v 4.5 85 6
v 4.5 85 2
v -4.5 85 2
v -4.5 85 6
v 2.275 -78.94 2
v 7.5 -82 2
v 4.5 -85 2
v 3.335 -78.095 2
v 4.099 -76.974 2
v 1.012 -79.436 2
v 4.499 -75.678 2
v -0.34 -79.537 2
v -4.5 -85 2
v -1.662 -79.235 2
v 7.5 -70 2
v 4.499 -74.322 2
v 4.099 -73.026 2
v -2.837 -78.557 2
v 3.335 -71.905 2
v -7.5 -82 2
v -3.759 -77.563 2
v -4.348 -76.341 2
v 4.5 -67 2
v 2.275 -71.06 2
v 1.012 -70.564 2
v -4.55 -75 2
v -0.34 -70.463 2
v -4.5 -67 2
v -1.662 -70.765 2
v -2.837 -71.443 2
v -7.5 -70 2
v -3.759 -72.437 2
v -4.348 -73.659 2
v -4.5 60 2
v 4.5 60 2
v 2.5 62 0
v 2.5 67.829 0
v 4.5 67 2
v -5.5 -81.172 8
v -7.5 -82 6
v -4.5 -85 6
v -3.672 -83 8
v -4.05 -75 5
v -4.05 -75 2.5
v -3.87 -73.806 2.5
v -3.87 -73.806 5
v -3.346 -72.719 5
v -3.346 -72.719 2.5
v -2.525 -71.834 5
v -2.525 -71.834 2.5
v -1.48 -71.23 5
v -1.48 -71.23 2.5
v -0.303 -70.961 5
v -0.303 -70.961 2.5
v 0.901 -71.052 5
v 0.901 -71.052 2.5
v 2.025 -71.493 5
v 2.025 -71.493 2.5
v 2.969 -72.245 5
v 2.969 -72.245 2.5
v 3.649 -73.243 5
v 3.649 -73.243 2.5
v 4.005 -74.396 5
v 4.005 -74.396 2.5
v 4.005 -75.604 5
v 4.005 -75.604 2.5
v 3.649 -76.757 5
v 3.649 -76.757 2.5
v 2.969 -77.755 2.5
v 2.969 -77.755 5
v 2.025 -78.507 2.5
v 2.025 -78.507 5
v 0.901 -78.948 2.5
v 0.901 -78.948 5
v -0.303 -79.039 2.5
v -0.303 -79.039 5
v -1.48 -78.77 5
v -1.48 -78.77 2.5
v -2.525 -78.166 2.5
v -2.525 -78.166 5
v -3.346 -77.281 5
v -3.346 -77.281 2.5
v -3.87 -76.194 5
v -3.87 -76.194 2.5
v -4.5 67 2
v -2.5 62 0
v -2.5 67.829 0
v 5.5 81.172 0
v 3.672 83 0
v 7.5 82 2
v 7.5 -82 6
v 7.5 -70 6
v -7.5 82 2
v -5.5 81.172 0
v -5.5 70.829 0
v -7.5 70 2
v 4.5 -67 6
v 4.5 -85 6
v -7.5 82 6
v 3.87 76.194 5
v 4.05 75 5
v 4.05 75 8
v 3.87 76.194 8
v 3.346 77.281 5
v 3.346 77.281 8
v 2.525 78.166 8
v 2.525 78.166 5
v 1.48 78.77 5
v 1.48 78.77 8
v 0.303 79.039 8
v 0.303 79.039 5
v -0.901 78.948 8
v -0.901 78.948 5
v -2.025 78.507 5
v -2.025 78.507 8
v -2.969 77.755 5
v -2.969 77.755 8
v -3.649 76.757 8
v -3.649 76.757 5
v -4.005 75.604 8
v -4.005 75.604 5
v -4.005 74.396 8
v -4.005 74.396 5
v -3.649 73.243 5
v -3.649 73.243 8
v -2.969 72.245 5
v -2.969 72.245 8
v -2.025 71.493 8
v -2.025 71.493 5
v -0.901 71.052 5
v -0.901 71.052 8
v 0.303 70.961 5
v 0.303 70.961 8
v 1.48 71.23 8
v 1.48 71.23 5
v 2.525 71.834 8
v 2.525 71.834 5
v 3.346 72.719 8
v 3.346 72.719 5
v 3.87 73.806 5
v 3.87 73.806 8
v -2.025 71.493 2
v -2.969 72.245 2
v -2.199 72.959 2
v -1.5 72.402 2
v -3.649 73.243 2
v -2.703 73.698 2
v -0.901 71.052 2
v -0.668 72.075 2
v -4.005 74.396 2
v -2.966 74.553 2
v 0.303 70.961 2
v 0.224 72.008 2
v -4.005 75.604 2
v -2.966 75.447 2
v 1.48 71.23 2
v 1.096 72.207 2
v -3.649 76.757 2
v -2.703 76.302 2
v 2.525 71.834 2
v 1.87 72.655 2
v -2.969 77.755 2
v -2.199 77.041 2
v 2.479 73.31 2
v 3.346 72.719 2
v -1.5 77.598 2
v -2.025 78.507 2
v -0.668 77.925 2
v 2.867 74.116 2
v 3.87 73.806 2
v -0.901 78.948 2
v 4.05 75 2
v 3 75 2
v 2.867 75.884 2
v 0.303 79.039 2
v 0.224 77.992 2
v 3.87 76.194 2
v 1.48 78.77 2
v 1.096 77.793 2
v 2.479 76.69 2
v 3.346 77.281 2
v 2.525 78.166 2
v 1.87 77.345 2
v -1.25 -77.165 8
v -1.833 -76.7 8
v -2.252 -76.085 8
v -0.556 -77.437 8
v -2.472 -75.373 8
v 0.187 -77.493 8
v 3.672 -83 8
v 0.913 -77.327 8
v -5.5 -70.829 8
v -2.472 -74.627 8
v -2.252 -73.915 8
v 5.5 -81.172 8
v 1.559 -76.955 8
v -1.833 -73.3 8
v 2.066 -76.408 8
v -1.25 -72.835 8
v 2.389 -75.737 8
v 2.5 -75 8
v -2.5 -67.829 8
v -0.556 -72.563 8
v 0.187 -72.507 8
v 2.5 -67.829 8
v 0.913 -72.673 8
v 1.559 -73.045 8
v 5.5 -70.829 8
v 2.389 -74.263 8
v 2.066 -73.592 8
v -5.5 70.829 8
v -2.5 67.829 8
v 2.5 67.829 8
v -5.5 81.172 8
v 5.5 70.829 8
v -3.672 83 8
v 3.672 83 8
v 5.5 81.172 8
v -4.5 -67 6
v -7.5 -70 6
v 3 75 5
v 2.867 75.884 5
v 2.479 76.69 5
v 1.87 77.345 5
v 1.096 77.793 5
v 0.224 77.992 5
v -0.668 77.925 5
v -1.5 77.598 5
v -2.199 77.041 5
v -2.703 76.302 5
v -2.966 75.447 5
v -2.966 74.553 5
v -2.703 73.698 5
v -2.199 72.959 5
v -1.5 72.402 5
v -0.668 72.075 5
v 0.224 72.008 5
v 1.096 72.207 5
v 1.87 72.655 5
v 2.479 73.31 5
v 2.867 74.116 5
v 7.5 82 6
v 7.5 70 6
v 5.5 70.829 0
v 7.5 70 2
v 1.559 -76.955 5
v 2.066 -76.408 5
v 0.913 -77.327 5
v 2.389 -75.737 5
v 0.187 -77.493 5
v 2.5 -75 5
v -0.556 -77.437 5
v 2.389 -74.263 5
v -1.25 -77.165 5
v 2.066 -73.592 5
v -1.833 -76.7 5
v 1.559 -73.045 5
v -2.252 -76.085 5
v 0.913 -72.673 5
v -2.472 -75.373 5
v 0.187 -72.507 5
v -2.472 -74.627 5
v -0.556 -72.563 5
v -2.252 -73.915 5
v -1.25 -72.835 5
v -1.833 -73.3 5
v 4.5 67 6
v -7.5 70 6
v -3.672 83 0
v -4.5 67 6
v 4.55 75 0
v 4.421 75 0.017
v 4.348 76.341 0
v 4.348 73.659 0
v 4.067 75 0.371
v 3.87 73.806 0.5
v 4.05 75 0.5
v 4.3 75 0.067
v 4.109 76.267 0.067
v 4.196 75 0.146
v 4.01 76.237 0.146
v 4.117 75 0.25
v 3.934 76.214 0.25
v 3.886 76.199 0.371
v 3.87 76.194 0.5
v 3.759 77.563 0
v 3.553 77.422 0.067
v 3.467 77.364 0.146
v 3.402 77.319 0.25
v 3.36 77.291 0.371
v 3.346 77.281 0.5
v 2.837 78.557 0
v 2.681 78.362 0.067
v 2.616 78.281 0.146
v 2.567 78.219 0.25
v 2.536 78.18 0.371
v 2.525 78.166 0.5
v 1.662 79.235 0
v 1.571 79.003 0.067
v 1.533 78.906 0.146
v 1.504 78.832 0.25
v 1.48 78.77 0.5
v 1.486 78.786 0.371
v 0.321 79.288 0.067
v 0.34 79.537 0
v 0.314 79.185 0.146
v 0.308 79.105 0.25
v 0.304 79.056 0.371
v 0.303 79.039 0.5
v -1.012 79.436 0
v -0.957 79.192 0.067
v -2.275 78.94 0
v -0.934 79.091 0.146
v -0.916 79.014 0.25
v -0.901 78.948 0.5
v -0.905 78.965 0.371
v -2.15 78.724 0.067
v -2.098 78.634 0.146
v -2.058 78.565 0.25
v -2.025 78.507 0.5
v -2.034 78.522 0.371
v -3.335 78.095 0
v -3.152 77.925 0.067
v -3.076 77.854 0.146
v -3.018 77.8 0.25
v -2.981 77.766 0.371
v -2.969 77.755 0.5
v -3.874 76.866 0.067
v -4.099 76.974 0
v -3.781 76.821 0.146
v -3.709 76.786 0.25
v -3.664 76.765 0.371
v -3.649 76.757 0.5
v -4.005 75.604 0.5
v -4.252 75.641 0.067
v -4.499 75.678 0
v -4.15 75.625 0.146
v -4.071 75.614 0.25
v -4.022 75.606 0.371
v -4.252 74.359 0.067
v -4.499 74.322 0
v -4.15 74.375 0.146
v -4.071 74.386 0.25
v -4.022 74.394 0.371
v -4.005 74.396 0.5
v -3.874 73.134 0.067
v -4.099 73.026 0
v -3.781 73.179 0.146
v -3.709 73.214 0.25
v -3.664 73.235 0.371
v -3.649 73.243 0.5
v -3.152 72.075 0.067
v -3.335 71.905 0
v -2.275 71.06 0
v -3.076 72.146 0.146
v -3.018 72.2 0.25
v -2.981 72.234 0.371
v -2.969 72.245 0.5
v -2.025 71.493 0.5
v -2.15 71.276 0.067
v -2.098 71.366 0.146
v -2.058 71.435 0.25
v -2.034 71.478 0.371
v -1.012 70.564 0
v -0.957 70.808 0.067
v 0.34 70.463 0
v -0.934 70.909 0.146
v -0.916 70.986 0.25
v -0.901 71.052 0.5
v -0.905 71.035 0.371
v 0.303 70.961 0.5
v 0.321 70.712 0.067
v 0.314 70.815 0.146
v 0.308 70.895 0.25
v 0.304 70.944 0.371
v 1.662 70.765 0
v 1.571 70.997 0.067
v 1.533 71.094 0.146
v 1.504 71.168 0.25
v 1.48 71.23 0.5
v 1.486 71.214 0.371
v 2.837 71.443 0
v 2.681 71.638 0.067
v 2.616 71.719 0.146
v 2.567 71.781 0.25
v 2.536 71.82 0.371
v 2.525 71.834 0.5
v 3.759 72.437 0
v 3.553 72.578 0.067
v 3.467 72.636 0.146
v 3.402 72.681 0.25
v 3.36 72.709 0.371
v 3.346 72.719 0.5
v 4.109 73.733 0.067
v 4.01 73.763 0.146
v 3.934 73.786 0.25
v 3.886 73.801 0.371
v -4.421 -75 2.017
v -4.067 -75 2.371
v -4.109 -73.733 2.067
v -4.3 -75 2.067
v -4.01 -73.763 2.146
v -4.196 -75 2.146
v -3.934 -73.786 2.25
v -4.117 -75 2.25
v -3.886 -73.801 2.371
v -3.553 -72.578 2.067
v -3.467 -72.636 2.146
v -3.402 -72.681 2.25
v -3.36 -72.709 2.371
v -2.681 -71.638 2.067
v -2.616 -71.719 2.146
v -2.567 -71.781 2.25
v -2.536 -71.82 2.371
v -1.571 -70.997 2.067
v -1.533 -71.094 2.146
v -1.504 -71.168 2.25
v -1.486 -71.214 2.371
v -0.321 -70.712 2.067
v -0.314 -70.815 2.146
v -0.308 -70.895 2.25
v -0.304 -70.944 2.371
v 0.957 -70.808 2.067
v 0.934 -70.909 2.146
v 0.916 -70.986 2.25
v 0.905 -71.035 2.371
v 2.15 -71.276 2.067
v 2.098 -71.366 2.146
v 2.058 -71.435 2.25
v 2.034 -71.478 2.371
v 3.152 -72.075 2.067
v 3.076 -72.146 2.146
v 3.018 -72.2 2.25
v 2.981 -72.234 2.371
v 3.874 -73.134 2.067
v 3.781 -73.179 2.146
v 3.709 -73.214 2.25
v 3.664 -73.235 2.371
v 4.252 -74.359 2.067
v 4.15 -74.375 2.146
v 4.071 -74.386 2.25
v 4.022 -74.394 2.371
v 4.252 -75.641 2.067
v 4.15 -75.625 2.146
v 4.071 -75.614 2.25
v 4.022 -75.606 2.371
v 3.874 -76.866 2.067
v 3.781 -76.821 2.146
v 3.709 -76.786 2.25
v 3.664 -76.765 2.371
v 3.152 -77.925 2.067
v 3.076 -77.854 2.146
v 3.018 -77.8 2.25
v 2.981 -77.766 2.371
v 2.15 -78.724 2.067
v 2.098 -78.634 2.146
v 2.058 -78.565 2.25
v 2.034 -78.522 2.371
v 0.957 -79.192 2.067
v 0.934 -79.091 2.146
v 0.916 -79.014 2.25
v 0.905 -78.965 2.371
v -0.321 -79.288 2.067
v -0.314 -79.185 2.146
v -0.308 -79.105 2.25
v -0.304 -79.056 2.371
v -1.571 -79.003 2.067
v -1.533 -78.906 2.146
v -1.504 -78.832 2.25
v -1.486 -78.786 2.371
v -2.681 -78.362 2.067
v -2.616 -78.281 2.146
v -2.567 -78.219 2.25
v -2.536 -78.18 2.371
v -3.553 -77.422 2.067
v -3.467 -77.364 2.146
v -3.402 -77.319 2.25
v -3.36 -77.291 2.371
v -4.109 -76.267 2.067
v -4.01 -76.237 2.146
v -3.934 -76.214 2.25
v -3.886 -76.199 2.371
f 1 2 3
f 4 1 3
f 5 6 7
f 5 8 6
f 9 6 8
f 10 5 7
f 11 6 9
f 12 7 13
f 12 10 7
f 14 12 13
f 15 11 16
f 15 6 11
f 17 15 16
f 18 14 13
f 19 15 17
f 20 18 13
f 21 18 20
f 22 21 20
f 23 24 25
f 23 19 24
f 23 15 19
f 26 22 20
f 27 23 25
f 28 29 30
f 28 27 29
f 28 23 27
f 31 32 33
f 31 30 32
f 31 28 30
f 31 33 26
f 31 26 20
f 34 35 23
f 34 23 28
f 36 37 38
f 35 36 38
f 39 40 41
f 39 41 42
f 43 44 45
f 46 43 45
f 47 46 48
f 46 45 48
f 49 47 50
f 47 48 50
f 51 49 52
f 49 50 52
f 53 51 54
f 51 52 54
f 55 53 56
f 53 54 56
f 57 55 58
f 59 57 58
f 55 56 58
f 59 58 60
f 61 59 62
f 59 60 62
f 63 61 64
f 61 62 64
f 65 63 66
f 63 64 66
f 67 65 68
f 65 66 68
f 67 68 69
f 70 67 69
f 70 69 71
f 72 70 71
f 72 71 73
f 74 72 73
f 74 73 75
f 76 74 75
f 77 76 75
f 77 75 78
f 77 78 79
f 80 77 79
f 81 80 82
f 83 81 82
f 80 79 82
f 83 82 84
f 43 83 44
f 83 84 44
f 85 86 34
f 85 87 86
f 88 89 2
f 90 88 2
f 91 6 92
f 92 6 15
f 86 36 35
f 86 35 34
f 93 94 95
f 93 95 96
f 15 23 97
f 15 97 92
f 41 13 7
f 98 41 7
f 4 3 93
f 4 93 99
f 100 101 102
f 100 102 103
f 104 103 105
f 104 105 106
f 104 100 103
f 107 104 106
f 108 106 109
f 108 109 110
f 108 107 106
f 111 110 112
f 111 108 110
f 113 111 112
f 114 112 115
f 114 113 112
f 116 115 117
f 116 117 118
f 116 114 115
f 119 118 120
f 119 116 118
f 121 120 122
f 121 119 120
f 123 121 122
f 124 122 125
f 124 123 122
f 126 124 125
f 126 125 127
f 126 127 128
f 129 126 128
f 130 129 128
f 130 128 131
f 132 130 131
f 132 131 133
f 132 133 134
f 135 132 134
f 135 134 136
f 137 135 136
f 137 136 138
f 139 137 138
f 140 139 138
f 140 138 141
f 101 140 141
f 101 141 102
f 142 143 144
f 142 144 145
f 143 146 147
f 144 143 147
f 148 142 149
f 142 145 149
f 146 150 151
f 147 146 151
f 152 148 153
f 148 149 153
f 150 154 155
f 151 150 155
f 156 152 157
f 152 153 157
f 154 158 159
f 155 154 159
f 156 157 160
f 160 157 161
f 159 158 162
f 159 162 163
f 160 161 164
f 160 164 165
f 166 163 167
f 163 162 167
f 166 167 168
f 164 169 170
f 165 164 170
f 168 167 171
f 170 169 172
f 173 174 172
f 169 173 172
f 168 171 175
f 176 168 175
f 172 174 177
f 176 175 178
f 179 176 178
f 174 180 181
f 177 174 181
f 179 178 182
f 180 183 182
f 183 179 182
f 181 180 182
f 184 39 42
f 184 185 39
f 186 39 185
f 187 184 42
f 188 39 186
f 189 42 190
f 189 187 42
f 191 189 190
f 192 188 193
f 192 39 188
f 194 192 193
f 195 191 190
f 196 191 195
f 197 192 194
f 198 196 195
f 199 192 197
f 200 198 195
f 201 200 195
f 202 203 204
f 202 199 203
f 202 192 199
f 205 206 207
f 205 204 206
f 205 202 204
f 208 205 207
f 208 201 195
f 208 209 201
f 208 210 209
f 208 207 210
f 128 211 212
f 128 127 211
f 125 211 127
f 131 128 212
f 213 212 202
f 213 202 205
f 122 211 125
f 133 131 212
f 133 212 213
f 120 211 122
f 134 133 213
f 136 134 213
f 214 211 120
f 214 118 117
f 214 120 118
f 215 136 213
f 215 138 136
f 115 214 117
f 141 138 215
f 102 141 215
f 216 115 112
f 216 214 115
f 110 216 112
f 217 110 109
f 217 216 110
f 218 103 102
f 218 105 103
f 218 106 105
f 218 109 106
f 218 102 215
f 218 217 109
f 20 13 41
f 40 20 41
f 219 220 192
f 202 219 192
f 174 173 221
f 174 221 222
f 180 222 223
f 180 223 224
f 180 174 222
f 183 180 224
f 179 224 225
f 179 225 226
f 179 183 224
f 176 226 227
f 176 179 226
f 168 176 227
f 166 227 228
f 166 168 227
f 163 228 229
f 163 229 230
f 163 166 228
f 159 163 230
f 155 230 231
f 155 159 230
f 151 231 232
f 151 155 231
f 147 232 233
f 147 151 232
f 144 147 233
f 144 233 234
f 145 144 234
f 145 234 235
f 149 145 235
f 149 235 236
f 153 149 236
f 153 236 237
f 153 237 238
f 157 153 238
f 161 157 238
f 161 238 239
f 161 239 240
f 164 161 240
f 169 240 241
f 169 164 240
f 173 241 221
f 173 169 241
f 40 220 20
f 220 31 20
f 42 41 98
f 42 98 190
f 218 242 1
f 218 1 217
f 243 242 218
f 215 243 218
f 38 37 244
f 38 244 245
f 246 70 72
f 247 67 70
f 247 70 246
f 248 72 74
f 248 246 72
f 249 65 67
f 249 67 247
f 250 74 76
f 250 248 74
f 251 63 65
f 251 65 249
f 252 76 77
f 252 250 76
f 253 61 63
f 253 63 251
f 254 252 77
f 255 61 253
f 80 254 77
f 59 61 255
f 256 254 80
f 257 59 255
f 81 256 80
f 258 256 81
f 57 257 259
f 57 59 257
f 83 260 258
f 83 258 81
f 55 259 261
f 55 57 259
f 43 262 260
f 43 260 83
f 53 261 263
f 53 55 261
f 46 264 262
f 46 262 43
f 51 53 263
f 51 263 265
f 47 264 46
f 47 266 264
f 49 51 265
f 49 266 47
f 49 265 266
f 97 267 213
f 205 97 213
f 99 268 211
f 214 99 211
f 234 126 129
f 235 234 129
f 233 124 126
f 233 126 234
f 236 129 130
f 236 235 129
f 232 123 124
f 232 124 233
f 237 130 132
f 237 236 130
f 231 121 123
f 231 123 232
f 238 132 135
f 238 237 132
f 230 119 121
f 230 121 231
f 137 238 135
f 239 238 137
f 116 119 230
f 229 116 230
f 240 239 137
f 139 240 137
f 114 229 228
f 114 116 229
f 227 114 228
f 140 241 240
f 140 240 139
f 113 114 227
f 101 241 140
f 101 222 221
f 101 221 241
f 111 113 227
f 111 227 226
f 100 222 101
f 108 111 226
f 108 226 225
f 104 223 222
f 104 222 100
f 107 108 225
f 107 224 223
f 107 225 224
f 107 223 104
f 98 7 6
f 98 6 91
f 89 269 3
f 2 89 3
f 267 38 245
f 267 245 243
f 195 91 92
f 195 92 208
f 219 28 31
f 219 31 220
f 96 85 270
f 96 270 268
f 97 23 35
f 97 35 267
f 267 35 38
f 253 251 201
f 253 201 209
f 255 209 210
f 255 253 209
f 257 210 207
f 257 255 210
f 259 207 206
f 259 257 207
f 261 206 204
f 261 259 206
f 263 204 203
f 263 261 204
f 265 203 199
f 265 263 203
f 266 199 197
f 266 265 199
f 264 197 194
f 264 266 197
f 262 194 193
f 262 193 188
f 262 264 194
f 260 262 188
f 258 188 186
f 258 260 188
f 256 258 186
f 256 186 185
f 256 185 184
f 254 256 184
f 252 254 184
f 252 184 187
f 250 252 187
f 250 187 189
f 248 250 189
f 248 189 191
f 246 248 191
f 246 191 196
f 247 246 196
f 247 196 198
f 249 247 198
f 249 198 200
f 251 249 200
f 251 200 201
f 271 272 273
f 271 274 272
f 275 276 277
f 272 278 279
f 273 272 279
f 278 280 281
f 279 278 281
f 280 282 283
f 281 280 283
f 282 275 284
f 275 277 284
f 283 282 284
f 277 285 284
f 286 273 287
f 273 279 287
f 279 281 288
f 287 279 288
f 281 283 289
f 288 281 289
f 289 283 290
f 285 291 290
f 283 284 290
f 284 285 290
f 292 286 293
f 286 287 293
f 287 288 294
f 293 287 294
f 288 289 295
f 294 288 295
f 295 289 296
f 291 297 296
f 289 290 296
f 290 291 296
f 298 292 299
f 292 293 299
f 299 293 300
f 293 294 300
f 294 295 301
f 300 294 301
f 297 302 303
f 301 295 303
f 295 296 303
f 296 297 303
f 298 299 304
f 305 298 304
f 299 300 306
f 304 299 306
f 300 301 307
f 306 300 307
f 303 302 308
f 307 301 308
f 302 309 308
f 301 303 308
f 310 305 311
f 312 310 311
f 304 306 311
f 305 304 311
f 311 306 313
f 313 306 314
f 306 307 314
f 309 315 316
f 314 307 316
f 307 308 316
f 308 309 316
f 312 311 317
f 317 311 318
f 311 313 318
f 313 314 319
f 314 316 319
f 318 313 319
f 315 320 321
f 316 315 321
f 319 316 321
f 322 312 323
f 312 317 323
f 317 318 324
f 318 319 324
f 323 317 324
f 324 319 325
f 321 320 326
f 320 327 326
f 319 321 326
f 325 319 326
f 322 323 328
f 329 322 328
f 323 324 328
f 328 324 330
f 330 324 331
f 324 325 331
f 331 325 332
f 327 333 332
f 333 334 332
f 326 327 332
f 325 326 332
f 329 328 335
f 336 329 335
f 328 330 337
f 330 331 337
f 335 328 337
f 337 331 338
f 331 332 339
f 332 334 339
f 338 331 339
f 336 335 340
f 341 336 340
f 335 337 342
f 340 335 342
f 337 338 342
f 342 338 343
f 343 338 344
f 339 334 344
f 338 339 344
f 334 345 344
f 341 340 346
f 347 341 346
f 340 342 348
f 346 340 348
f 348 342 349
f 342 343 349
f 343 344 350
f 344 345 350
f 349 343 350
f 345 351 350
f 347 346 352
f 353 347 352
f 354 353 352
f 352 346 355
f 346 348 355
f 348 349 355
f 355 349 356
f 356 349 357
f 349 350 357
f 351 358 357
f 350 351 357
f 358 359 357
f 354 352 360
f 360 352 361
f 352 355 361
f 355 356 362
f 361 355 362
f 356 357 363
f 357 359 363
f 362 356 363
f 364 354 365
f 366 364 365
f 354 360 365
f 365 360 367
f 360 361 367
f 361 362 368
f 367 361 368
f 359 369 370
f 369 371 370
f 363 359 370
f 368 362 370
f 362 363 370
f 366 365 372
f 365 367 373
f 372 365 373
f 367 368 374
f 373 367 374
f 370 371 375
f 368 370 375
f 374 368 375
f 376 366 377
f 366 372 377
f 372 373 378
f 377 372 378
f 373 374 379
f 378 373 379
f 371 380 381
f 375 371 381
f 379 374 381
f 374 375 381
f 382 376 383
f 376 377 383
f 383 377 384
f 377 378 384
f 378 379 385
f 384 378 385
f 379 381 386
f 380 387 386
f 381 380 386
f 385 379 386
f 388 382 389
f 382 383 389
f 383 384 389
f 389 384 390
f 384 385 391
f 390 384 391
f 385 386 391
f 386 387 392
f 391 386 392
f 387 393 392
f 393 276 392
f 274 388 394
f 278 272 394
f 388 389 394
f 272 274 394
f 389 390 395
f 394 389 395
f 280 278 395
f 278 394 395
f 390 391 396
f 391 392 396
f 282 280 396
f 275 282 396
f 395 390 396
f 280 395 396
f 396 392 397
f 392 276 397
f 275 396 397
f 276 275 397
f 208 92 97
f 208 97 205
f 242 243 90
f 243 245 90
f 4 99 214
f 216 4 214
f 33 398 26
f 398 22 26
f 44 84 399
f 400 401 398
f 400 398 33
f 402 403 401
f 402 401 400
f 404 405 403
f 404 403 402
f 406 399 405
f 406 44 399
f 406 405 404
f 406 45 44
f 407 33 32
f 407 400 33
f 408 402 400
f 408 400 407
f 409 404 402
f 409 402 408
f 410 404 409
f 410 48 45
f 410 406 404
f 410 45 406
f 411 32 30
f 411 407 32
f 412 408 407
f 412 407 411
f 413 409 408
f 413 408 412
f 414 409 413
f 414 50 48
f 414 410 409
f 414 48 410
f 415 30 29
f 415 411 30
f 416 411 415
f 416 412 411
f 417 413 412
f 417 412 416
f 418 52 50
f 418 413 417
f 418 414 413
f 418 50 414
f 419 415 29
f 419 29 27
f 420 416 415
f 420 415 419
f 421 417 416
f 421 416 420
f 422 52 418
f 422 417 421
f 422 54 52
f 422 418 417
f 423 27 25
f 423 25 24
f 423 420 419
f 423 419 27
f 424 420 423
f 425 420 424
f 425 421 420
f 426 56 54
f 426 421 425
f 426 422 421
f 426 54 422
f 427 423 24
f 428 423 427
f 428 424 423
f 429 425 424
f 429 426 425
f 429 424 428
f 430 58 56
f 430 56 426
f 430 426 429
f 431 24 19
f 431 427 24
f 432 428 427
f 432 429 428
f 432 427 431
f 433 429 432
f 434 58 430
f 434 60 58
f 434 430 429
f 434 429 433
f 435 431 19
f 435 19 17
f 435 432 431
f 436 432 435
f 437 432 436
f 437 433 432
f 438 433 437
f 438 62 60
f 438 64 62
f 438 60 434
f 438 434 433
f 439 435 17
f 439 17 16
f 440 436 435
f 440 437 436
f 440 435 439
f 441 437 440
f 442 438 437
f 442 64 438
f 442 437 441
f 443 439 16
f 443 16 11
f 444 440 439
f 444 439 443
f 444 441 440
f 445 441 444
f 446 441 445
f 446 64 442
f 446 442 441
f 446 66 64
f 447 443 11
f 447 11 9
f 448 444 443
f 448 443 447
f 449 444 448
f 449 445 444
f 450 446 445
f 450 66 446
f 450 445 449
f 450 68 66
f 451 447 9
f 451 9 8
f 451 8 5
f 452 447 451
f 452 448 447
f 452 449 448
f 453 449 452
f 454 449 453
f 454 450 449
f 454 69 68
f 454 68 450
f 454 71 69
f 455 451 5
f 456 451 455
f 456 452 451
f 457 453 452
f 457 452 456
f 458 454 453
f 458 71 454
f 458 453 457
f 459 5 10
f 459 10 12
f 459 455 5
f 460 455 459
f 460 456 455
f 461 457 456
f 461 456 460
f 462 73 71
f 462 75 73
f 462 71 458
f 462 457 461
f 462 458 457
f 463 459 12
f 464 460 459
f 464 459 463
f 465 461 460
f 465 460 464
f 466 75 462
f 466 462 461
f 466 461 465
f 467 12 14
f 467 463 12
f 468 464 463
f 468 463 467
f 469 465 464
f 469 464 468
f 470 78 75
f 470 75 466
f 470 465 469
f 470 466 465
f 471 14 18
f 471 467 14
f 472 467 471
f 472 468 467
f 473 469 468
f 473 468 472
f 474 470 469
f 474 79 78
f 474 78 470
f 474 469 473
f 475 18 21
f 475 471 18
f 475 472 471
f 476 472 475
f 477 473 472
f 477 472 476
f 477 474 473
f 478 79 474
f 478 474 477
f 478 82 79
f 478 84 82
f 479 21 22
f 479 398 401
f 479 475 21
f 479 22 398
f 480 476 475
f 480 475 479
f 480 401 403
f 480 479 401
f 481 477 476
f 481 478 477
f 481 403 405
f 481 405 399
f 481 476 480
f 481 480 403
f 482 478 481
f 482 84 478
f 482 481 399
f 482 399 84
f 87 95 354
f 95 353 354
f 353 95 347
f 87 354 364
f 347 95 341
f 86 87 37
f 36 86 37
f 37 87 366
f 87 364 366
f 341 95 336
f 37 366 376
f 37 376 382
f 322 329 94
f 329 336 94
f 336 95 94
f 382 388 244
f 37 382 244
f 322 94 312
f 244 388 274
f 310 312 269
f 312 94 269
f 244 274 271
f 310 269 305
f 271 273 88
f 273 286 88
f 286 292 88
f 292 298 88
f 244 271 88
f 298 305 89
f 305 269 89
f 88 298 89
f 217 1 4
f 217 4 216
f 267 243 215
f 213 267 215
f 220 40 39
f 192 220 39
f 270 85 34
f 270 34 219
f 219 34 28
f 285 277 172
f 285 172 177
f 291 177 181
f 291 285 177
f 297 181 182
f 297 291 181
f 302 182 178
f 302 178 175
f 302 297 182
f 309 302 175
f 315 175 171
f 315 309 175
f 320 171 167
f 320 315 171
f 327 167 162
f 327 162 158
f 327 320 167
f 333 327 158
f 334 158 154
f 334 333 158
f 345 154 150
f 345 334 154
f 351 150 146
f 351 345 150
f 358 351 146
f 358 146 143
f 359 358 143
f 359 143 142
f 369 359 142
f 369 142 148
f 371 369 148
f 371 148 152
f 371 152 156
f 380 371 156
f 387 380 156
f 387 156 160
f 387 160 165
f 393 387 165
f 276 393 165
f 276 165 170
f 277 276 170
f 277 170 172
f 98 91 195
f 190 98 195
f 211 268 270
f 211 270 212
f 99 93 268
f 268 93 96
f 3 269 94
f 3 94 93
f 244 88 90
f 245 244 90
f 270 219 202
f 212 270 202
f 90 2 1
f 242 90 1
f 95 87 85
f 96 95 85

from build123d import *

# Parameters (mm, degrees)
SKETCH_1_R           = 2.5
SKETCH_1_R_2         = 4.05
EXTRUDE_1_DEPTH      = 8
CHAMFER_2_SIZE       = 3
EXTRUDE_2_DEPTH      = 1
EXTRUDE_2_DEPTH_BACK = 2
SKETCH_2_R           = 4.05
SKETCH_2_R_2         = 3
CHAMFER_3_SIZE       = 2
CHAMFER_4_SIZE       = 2
FILLET_1_R           = 0.5
FILLET_2_R           = 0.5
SKETCH_3_W           = 18.755341831
SKETCH_3_H           = 148.115808698
CUT_EXTRUDE_1_DEPTH  = 2
CHAMFER_5_SIZE       = 2
SKETCH_4_R           = 4.05
CUT_EXTRUDE_2_DEPTH  = 3
FILLET_3_R           = 0.5


# Some blends are built 0.0001 mm under size
with BuildPart() as part:
    # 草图1 → 凸台-拉伸1 (new body)
    with BuildSketch(Plane.XY):
        Polygon((-7.5, 70), (-4.5, 70), (-4.5, -70), (-7.5, -70), (-7.5, -85), (7.5, -85), (7.5, -70), (4.5, -70), (4.5, 70), (7.5, 70), (7.5, 85), (-7.5, 85), align=None)
        with Locations((0, -75)):
            Circle(SKETCH_1_R, mode=Mode.SUBTRACT)
        with Locations((0, 75)):
            Circle(SKETCH_1_R_2, mode=Mode.SUBTRACT)
    extrude(amount=EXTRUDE_1_DEPTH)

    # 倒角2
    chamfer_2_edges = [part.edges().sort_by_distance(p)[0] for p in [
        (-4.5, -70, 4),
        (4.5, -70, 4),
        (-4.5, 70, 4),
        (4.5, 70, 4),
    ]]
    chamfer(chamfer_2_edges, length=CHAMFER_2_SIZE - 0.0001)  # a hair under: the kernel refuses the full size
    chamfer_2_2_edges = [part.edges().sort_by_distance(p)[0] for p in [
        (7.5, -85, 4),
        (-7.5, -85, 4),
        (7.5, 85, 4),
        (-7.5, 85, 4),
    ]]
    chamfer(chamfer_2_2_edges, length=CHAMFER_2_SIZE)

    # 草图2 → 凸台-拉伸2 (add, two sides: drawn at the far end of the back side and taken through both)
    with BuildSketch(Plane.XY.offset(4).offset(-EXTRUDE_2_DEPTH_BACK)):
        with Locations((0, 75)):
            Circle(SKETCH_2_R)
        with Locations((0, 75)):
            Circle(SKETCH_2_R_2, mode=Mode.SUBTRACT)
    extrude(amount=EXTRUDE_2_DEPTH + EXTRUDE_2_DEPTH_BACK)

    # 倒角3
    # the kernel refuses this chamfer: 2 mm, written as the material it takes off along each edge
    with BuildSketch(Plane(origin=(-7.5, -64.856634024, 8), x_dir=(-0.027495876610586487, 0, -0.9996219169112968), z_dir=(0, -1, 0)), Plane(origin=(7.5, -87.143365976, 8), x_dir=(0.027495876610586487, 0, -0.9996219169112968), z_dir=(0, 1, 0)), Plane(origin=(7.5, 64.856634024, 8), x_dir=(0.027495876610586487, 0, -0.9996219169112968), z_dir=(0, 1, 0)), Plane(origin=(-7.5, 87.143365976, 8), x_dir=(-0.027495876610586487, 0, -0.9996219169112968), z_dir=(0, -1, 0))) as chamfer_3_piece_1:
        Polygon((CHAMFER_3_SIZE * 0.999621916911, CHAMFER_3_SIZE * 0.0274958766106), (-CHAMFER_3_SIZE * 0.0274958766106, CHAMFER_3_SIZE * 0.999621916911), (0, 0), align=None)
    extrude(amount=22.286731952, mode=Mode.SUBTRACT)
    with BuildSketch(Plane(origin=(-4.5, 72.143465976, 8), x_dir=(-0.027495876610586487, 0, -0.9996219169112968), z_dir=(0, -1, 0))) as chamfer_3_piece_2_section:
        Polygon((CHAMFER_3_SIZE * 0.999621916911, CHAMFER_3_SIZE * 0.0274958766106), (-CHAMFER_3_SIZE * 0.0274958766106, CHAMFER_3_SIZE * 0.999621916911), (0, 0), align=None)
    chamfer_3_piece_2 = extrude(amount=144.286931952, mode=Mode.PRIVATE)
    chamfer_3_piece_2 = split(chamfer_3_piece_2, bisect_by=Plane(origin=(29.327929184, 33.172170816, 7.338365808), z_dir=(-0.7071067811865471, -0.7071067811865479, 0)), keep=Keep.TOP, mode=Mode.PRIVATE)
    chamfer_3_piece_2 = split(chamfer_3_piece_2, bisect_by=Plane(origin=(29.327929184, -33.172170816, 7.338365808), z_dir=(-0.7071067811865472, 0.7071067811865479, 0)), keep=Keep.TOP, mode=Mode.PRIVATE)
    add(chamfer_3_piece_2, mode=Mode.SUBTRACT)
    with BuildSketch(Plane(origin=(4.5, -72.143465976, 8), x_dir=(0.027495876610586487, 0, -0.9996219169112968), z_dir=(0, 1, 0))) as chamfer_3_piece_3_section:
        Polygon((CHAMFER_3_SIZE * 0.999621916911, CHAMFER_3_SIZE * 0.0274958766106), (-CHAMFER_3_SIZE * 0.0274958766106, CHAMFER_3_SIZE * 0.999621916911), (0, 0), align=None)
    chamfer_3_piece_3 = extrude(amount=144.286931952, mode=Mode.PRIVATE)
    chamfer_3_piece_3 = split(chamfer_3_piece_3, bisect_by=Plane(origin=(-29.327929184, 33.172170816, 7.338365808), z_dir=(0.7071067811865471, -0.7071067811865479, 0)), keep=Keep.TOP, mode=Mode.PRIVATE)
    chamfer_3_piece_3 = split(chamfer_3_piece_3, bisect_by=Plane(origin=(-29.327929184, -33.172170816, 7.338365808), z_dir=(0.7071067811865472, 0.7071067811865479, 0)), keep=Keep.TOP, mode=Mode.PRIVATE)
    add(chamfer_3_piece_3, mode=Mode.SUBTRACT)
    with BuildSketch(Plane(origin=(-9.643365976, -85, 8), x_dir=(0, -0.02749587661058907, -0.9996219169112965), z_dir=(1, 0, 0)), Plane(origin=(9.643365976, 85, 8), x_dir=(0, 0.02749587661058907, -0.9996219169112965), z_dir=(-1, 0, 0))) as chamfer_3_piece_4:
        Polygon((CHAMFER_3_SIZE * 0.999621916911, CHAMFER_3_SIZE * 0.0274958766106), (-CHAMFER_3_SIZE * 0.0274958766106, CHAMFER_3_SIZE * 0.999621916911), (0, 0), align=None)
    extrude(amount=19.286731952, mode=Mode.SUBTRACT)
    with BuildSketch(Plane(origin=(-11.13690896, 78.36309104, 8), x_dir=(-0.019442520806016377, 0.019442520806016377, -0.9996219169112965), z_dir=(0.7071067811865476, 0.7071067811865476, 0)), Plane(origin=(0.86309104, 88.63690896, 8), x_dir=(0.019442520806015953, 0.019442520806015946, -0.9996219169112968), z_dir=(0.7071067811865475, -0.7071067811865476, 0))) as chamfer_3_piece_5:
        Polygon((CHAMFER_3_SIZE * 0.999621916911, -CHAMFER_3_SIZE * 0.0274958766106), (-CHAMFER_3_SIZE * 0.0274958766106, -CHAMFER_3_SIZE * 0.999621916911), (0, 0), align=None)
    extrude(amount=14.529372639, mode=Mode.SUBTRACT)
    with BuildSketch(Plane(origin=(-11.13690896, -78.36309104, 8), x_dir=(-0.019442520806016377, -0.019442520806016377, -0.9996219169112965), z_dir=(0.7071067811865476, -0.7071067811865476, 0)), Plane(origin=(0.86309104, -88.63690896, 8), x_dir=(0.019442520806015953, -0.019442520806015946, -0.9996219169112968), z_dir=(0.7071067811865475, 0.7071067811865476, 0))) as chamfer_3_piece_6:
        Polygon((CHAMFER_3_SIZE * 0.999621916911, CHAMFER_3_SIZE * 0.0274958766106), (-CHAMFER_3_SIZE * 0.0274958766106, CHAMFER_3_SIZE * 0.999621916911), (0, 0), align=None)
    extrude(amount=14.529372639, mode=Mode.SUBTRACT)
    with BuildSketch(Plane(origin=(-0.86309104, -63.36319104, 8), x_dir=(-0.01944252080601354, 0.019442520806013556, -0.9996219169112968), z_dir=(-0.7071067811865479, -0.7071067811865472, 0))) as chamfer_3_piece_7_section:
        Polygon((CHAMFER_3_SIZE * 0.999621916911, CHAMFER_3_SIZE * 0.0274958766106), (-CHAMFER_3_SIZE * 0.0274958766106, CHAMFER_3_SIZE * 0.999621916911), (0, 0), align=None)
    chamfer_3_piece_7 = extrude(amount=14.529231218, mode=Mode.PRIVATE)
    chamfer_3_piece_7 = split(chamfer_3_piece_7, bisect_by=Plane(origin=(-4.5, -68.843566402, 7.247508302), z_dir=(-1, 0, 0)), keep=Keep.TOP, mode=Mode.PRIVATE)
    add(chamfer_3_piece_7, mode=Mode.SUBTRACT)
    with BuildSketch(Plane(origin=(11.13680896, -73.63690896, 8), x_dir=(0.019442520806015506, 0.019442520806015526, -0.9996219169112968), z_dir=(-0.7071067811865479, 0.7071067811865472, 0))) as chamfer_3_piece_8_section:
        Polygon((CHAMFER_3_SIZE * 0.999621916911, CHAMFER_3_SIZE * 0.0274958766106), (-CHAMFER_3_SIZE * 0.0274958766106, CHAMFER_3_SIZE * 0.999621916911), (0, 0), align=None)
    chamfer_3_piece_8 = extrude(amount=14.529231218, mode=Mode.PRIVATE)
    chamfer_3_piece_8 = split(chamfer_3_piece_8, bisect_by=Plane(origin=(4.5, -72.06712973, 7.36381375), z_dir=(1, 0, 0)), keep=Keep.TOP, mode=Mode.PRIVATE)
    add(chamfer_3_piece_8, mode=Mode.SUBTRACT)
    with BuildSketch(Plane(origin=(-11.13680896, 73.63690896, 8), x_dir=(-0.019442520806015506, -0.019442520806015526, -0.9996219169112968), z_dir=(0.7071067811865479, -0.7071067811865471, 0))) as chamfer_3_piece_9_section:
        Polygon((CHAMFER_3_SIZE * 0.999621916911, CHAMFER_3_SIZE * 0.0274958766106), (-CHAMFER_3_SIZE * 0.0274958766106, CHAMFER_3_SIZE * 0.999621916911), (0, 0), align=None)
    chamfer_3_piece_9 = extrude(amount=14.529231218, mode=Mode.PRIVATE)
    chamfer_3_piece_9 = split(chamfer_3_piece_9, bisect_by=Plane(origin=(-4.5, 72.06712973, 7.36381375), z_dir=(-1, 0, 0)), keep=Keep.TOP, mode=Mode.PRIVATE)
    add(chamfer_3_piece_9, mode=Mode.SUBTRACT)
    with BuildSketch(Plane(origin=(0.86309104, 63.36319104, 8), x_dir=(0.019442520806013806, -0.019442520806013826, -0.9996219169112968), z_dir=(0.7071067811865479, 0.7071067811865471, 0))) as chamfer_3_piece_10_section:
        Polygon((CHAMFER_3_SIZE * 0.999621916911, CHAMFER_3_SIZE * 0.0274958766106), (-CHAMFER_3_SIZE * 0.0274958766106, CHAMFER_3_SIZE * 0.999621916911), (0, 0), align=None)
    chamfer_3_piece_10 = extrude(amount=14.529231218, mode=Mode.PRIVATE)
    chamfer_3_piece_10 = split(chamfer_3_piece_10, bisect_by=Plane(origin=(4.5, 68.843566402, 7.247508302), z_dir=(1, 0, 0)), keep=Keep.TOP, mode=Mode.PRIVATE)
    add(chamfer_3_piece_10, mode=Mode.SUBTRACT)
    with BuildSketch(Plane(origin=(-11.13680896, 73.63690896, 8), x_dir=(-0.019442520806015506, -0.019442520806015526, -0.9996219169112968), z_dir=(0.7071067811865479, -0.7071067811865471, 0))) as chamfer_3_piece_11a_section:
        Polygon((CHAMFER_3_SIZE * 0.999621916911, CHAMFER_3_SIZE * 0.0274958766106), (-CHAMFER_3_SIZE * 0.0274958766106, CHAMFER_3_SIZE * 0.999621916911), (0, 0), align=None)
    chamfer_3_piece_11a = extrude(amount=14.529231218, mode=Mode.PRIVATE)
    chamfer_3_piece_11a = split(chamfer_3_piece_11a, bisect_by=Plane(origin=(-4.5, 65.927671271, 7.36381375), z_dir=(1, 0, 0)), keep=Keep.TOP, mode=Mode.PRIVATE)
    with BuildSketch(Plane(origin=(-4.5, 72.143465976, 8), x_dir=(-0.027495876610586487, 0, -0.9996219169112968), z_dir=(0, -1, 0))) as chamfer_3_piece_11b_section:
        Polygon((CHAMFER_3_SIZE * 0.999621916911, CHAMFER_3_SIZE * 0.0274958766106), (-CHAMFER_3_SIZE * 0.0274958766106, CHAMFER_3_SIZE * 0.999621916911), (0, 0), align=None)
    chamfer_3_piece_11b = extrude(amount=144.286931952, mode=Mode.PRIVATE)
    chamfer_3_piece_11b = split(chamfer_3_piece_11b, bisect_by=Plane(origin=(-5.258321627, 67.758421627, 7.36381375), z_dir=(0.7071067811865471, 0.7071067811865479, 0)), keep=Keep.TOP, mode=Mode.PRIVATE)
    chamfer_3_piece_11 = chamfer_3_piece_11a & chamfer_3_piece_11b
    add(chamfer_3_piece_11, mode=Mode.SUBTRACT)
    with BuildSketch(Plane(origin=(-4.5, 72.143465976, 8), x_dir=(-0.027495876610586487, 0, -0.9996219169112968), z_dir=(0, -1, 0))) as chamfer_3_piece_12a_section:
        Polygon((CHAMFER_3_SIZE * 0.999621916911, CHAMFER_3_SIZE * 0.0274958766106), (-CHAMFER_3_SIZE * 0.0274958766106, CHAMFER_3_SIZE * 0.999621916911), (0, 0), align=None)
    chamfer_3_piece_12a = extrude(amount=144.286931952, mode=Mode.PRIVATE)
    chamfer_3_piece_12a = split(chamfer_3_piece_12a, bisect_by=Plane(origin=(-5.258321627, -67.758421627, 7.36381375), z_dir=(0.7071067811865472, -0.7071067811865479, 0)), keep=Keep.TOP, mode=Mode.PRIVATE)
    with BuildSketch(Plane(origin=(-0.86309104, -63.36319104, 8), x_dir=(-0.01944252080601354, 0.019442520806013556, -0.9996219169112968), z_dir=(-0.7071067811865479, -0.7071067811865472, 0))) as chamfer_3_piece_12b_section:
        Polygon((CHAMFER_3_SIZE * 0.999621916911, CHAMFER_3_SIZE * 0.0274958766106), (-CHAMFER_3_SIZE * 0.0274958766106, CHAMFER_3_SIZE * 0.999621916911), (0, 0), align=None)
    chamfer_3_piece_12b = extrude(amount=14.529231218, mode=Mode.PRIVATE)
    chamfer_3_piece_12b = split(chamfer_3_piece_12b, bisect_by=Plane(origin=(-4.5, -65.927671271, 7.36381375), z_dir=(1, 0, 0)), keep=Keep.TOP, mode=Mode.PRIVATE)
    chamfer_3_piece_12 = chamfer_3_piece_12a & chamfer_3_piece_12b
    add(chamfer_3_piece_12, mode=Mode.SUBTRACT)
    with BuildSketch(Plane(origin=(4.5, -72.143465976, 8), x_dir=(0.027495876610586487, 0, -0.9996219169112968), z_dir=(0, 1, 0))) as chamfer_3_piece_13a_section:
        Polygon((CHAMFER_3_SIZE * 0.999621916911, CHAMFER_3_SIZE * 0.0274958766106), (-CHAMFER_3_SIZE * 0.0274958766106, CHAMFER_3_SIZE * 0.999621916911), (0, 0), align=None)
    chamfer_3_piece_13a = extrude(amount=144.286931952, mode=Mode.PRIVATE)
    chamfer_3_piece_13a = split(chamfer_3_piece_13a, bisect_by=Plane(origin=(5.258321627, -67.758421627, 7.36381375), z_dir=(-0.7071067811865472, -0.7071067811865479, 0)), keep=Keep.TOP, mode=Mode.PRIVATE)
    with BuildSketch(Plane(origin=(11.13680896, -73.63690896, 8), x_dir=(0.019442520806015506, 0.019442520806015526, -0.9996219169112968), z_dir=(-0.7071067811865479, 0.7071067811865472, 0))) as chamfer_3_piece_13b_section:
        Polygon((CHAMFER_3_SIZE * 0.999621916911, CHAMFER_3_SIZE * 0.0274958766106), (-CHAMFER_3_SIZE * 0.0274958766106, CHAMFER_3_SIZE * 0.999621916911), (0, 0), align=None)
    chamfer_3_piece_13b = extrude(amount=14.529231218, mode=Mode.PRIVATE)
    chamfer_3_piece_13b = split(chamfer_3_piece_13b, bisect_by=Plane(origin=(4.5, -65.927671271, 7.36381375), z_dir=(-1, 0, 0)), keep=Keep.TOP, mode=Mode.PRIVATE)
    chamfer_3_piece_13 = chamfer_3_piece_13a & chamfer_3_piece_13b
    add(chamfer_3_piece_13, mode=Mode.SUBTRACT)
    with BuildSketch(Plane(origin=(0.86309104, 63.36319104, 8), x_dir=(0.019442520806013806, -0.019442520806013826, -0.9996219169112968), z_dir=(0.7071067811865479, 0.7071067811865471, 0))) as chamfer_3_piece_14a_section:
        Polygon((CHAMFER_3_SIZE * 0.999621916911, CHAMFER_3_SIZE * 0.0274958766106), (-CHAMFER_3_SIZE * 0.0274958766106, CHAMFER_3_SIZE * 0.999621916911), (0, 0), align=None)
    chamfer_3_piece_14a = extrude(amount=14.529231218, mode=Mode.PRIVATE)
    chamfer_3_piece_14a = split(chamfer_3_piece_14a, bisect_by=Plane(origin=(4.5, 65.927671271, 7.36381375), z_dir=(-1, 0, 0)), keep=Keep.TOP, mode=Mode.PRIVATE)
    with BuildSketch(Plane(origin=(4.5, -72.143465976, 8), x_dir=(0.027495876610586487, 0, -0.9996219169112968), z_dir=(0, 1, 0))) as chamfer_3_piece_14b_section:
        Polygon((CHAMFER_3_SIZE * 0.999621916911, CHAMFER_3_SIZE * 0.0274958766106), (-CHAMFER_3_SIZE * 0.0274958766106, CHAMFER_3_SIZE * 0.999621916911), (0, 0), align=None)
    chamfer_3_piece_14b = extrude(amount=144.286931952, mode=Mode.PRIVATE)
    chamfer_3_piece_14b = split(chamfer_3_piece_14b, bisect_by=Plane(origin=(5.258321627, 67.758421627, 7.36381375), z_dir=(-0.7071067811865471, 0.7071067811865479, 0)), keep=Keep.TOP, mode=Mode.PRIVATE)
    chamfer_3_piece_14 = chamfer_3_piece_14a & chamfer_3_piece_14b
    add(chamfer_3_piece_14, mode=Mode.SUBTRACT)

    # 倒角4
    # the kernel refuses this chamfer: 2 mm, written as the material it takes off along each edge
    with BuildSketch(Plane(origin=(-7.5, -64.856634024, 0), x_dir=(0.9996219169112968, 0, -0.027495876610586365), z_dir=(0, -1, 0)), Plane(origin=(7.5, 64.856634024, 0), x_dir=(-0.9996219169112968, 0, -0.027495876610586365), z_dir=(0, 1, 0)), Plane(origin=(7.5, -87.143365976, 0), x_dir=(-0.9996219169112968, 0, -0.027495876610586365), z_dir=(0, 1, 0)), Plane(origin=(-7.5, 87.143365976, 0), x_dir=(0.9996219169112968, 0, -0.027495876610586365), z_dir=(0, -1, 0))) as chamfer_4_piece_1:
        Polygon((CHAMFER_4_SIZE * 0.999621916911, CHAMFER_4_SIZE * 0.0274958766106), (-CHAMFER_4_SIZE * 0.0274958766106, CHAMFER_4_SIZE * 0.999621916911), (0, 0), align=None)
    extrude(amount=22.286731952, mode=Mode.SUBTRACT)
    with BuildSketch(Plane(origin=(-4.5, 72.143465976, 0), x_dir=(0.9996219169112968, 0, -0.027495876610586372), z_dir=(0, -1, 0))) as chamfer_4_piece_2_section:
        Polygon((CHAMFER_4_SIZE * 0.999621916911, CHAMFER_4_SIZE * 0.0274958766106), (-CHAMFER_4_SIZE * 0.0274958766106, CHAMFER_4_SIZE * 0.999621916911), (0, 0), align=None)
    chamfer_4_piece_2 = extrude(amount=144.286931952, mode=Mode.PRIVATE)
    chamfer_4_piece_2 = split(chamfer_4_piece_2, bisect_by=Plane(origin=(29.327929184, -33.172170816, 0.661634192), z_dir=(-0.7071067811865472, 0.7071067811865479, 0)), keep=Keep.TOP, mode=Mode.PRIVATE)
    chamfer_4_piece_2 = split(chamfer_4_piece_2, bisect_by=Plane(origin=(29.327929184, 33.172170816, 0.661634192), z_dir=(-0.7071067811865471, -0.7071067811865479, 0)), keep=Keep.TOP, mode=Mode.PRIVATE)
    add(chamfer_4_piece_2, mode=Mode.SUBTRACT)
    with BuildSketch(Plane(origin=(4.5, -72.143465976, 0), x_dir=(-0.9996219169112968, 0, -0.027495876610586372), z_dir=(0, 1, 0))) as chamfer_4_piece_3_section:
        Polygon((CHAMFER_4_SIZE * 0.999621916911, CHAMFER_4_SIZE * 0.0274958766106), (-CHAMFER_4_SIZE * 0.0274958766106, CHAMFER_4_SIZE * 0.999621916911), (0, 0), align=None)
    chamfer_4_piece_3 = extrude(amount=144.286931952, mode=Mode.PRIVATE)
    chamfer_4_piece_3 = split(chamfer_4_piece_3, bisect_by=Plane(origin=(-29.327929184, -33.172170816, 0.661634192), z_dir=(0.7071067811865472, 0.7071067811865479, 0)), keep=Keep.TOP, mode=Mode.PRIVATE)
    chamfer_4_piece_3 = split(chamfer_4_piece_3, bisect_by=Plane(origin=(-29.327929184, 33.172170816, 0.661634192), z_dir=(0.7071067811865471, -0.7071067811865479, 0)), keep=Keep.TOP, mode=Mode.PRIVATE)
    add(chamfer_4_piece_3, mode=Mode.SUBTRACT)
    with BuildSketch(Plane(origin=(-9.643365976, -85, 0), x_dir=(0, 0.9996219169112968, -0.027495876610586292), z_dir=(1, 0, 0)), Plane(origin=(9.643365976, 85, 0), x_dir=(0, -0.9996219169112968, -0.027495876610586292), z_dir=(-1, 0, 0))) as chamfer_4_piece_4:
        Polygon((CHAMFER_4_SIZE * 0.999621916911, CHAMFER_4_SIZE * 0.0274958766106), (-CHAMFER_4_SIZE * 0.0274958766106, CHAMFER_4_SIZE * 0.999621916911), (0, 0), align=None)
    extrude(amount=19.286731952, mode=Mode.SUBTRACT)
    with BuildSketch(Plane(origin=(-11.13690896, 78.36309104, 0), x_dir=(0.7068394360706736, -0.7068394360706736, -0.02749587661058632), z_dir=(0.7071067811865476, 0.7071067811865476, 0)), Plane(origin=(0.86309104, 88.63690896, 0), x_dir=(-0.7068394360706736, -0.7068394360706735, -0.027495876610586348), z_dir=(0.7071067811865475, -0.7071067811865476, 0))) as chamfer_4_piece_5:
        Polygon((CHAMFER_4_SIZE * 0.999621916911, -CHAMFER_4_SIZE * 0.0274958766106), (-CHAMFER_4_SIZE * 0.0274958766106, -CHAMFER_4_SIZE * 0.999621916911), (0, 0), align=None)
    extrude(amount=14.529372639, mode=Mode.SUBTRACT)
    with BuildSketch(Plane(origin=(-11.13690896, -78.36309104, 0), x_dir=(0.7068394360706736, 0.7068394360706736, -0.02749587661058632), z_dir=(0.7071067811865476, -0.7071067811865476, 0)), Plane(origin=(0.86309104, -88.63690896, 0), x_dir=(-0.7068394360706736, 0.7068394360706735, -0.027495876610586348), z_dir=(0.7071067811865475, 0.7071067811865476, 0))) as chamfer_4_piece_6:
        Polygon((CHAMFER_4_SIZE * 0.999621916911, CHAMFER_4_SIZE * 0.0274958766106), (-CHAMFER_4_SIZE * 0.0274958766106, CHAMFER_4_SIZE * 0.999621916911), (0, 0), align=None)
    extrude(amount=14.529372639, mode=Mode.SUBTRACT)
    with BuildSketch(Plane(origin=(-0.86309104, -63.36319104, 0), x_dir=(0.7068394360706732, -0.7068394360706739, -0.027495876610586244), z_dir=(-0.7071067811865479, -0.7071067811865472, 0))) as chamfer_4_piece_7_section:
        Polygon((CHAMFER_4_SIZE * 0.999621916911, CHAMFER_4_SIZE * 0.0274958766106), (-CHAMFER_4_SIZE * 0.0274958766106, CHAMFER_4_SIZE * 0.999621916911), (0, 0), align=None)
    chamfer_4_piece_7 = extrude(amount=14.529231218, mode=Mode.PRIVATE)
    chamfer_4_piece_7 = split(chamfer_4_piece_7, bisect_by=Plane(origin=(-4.5, -68.843566402, 0.752491698), z_dir=(-1, 0, 0)), keep=Keep.TOP, mode=Mode.PRIVATE)
    add(chamfer_4_piece_7, mode=Mode.SUBTRACT)
    with BuildSketch(Plane(origin=(11.13680896, -73.63690896, 0), x_dir=(-0.7068394360706731, -0.7068394360706738, -0.027495876610586365), z_dir=(-0.7071067811865479, 0.7071067811865472, 0))) as chamfer_4_piece_8_section:
        Polygon((CHAMFER_4_SIZE * 0.999621916911, CHAMFER_4_SIZE * 0.0274958766106), (-CHAMFER_4_SIZE * 0.0274958766106, CHAMFER_4_SIZE * 0.999621916911), (0, 0), align=None)
    chamfer_4_piece_8 = extrude(amount=14.529231218, mode=Mode.PRIVATE)
    chamfer_4_piece_8 = split(chamfer_4_piece_8, bisect_by=Plane(origin=(4.5, -72.06712973, 0.63618625), z_dir=(1, 0, 0)), keep=Keep.TOP, mode=Mode.PRIVATE)
    add(chamfer_4_piece_8, mode=Mode.SUBTRACT)
    with BuildSketch(Plane(origin=(-11.13680896, 73.63690896, 0), x_dir=(0.706839436070673, 0.7068394360706739, -0.027495876610586376), z_dir=(0.7071067811865479, -0.7071067811865471, 0))) as chamfer_4_piece_9_section:
        Polygon((CHAMFER_4_SIZE * 0.999621916911, CHAMFER_4_SIZE * 0.0274958766106), (-CHAMFER_4_SIZE * 0.0274958766106, CHAMFER_4_SIZE * 0.999621916911), (0, 0), align=None)
    chamfer_4_piece_9 = extrude(amount=14.529231218, mode=Mode.PRIVATE)
    chamfer_4_piece_9 = split(chamfer_4_piece_9, bisect_by=Plane(origin=(-4.5, 72.06712973, 0.63618625), z_dir=(-1, 0, 0)), keep=Keep.TOP, mode=Mode.PRIVATE)
    add(chamfer_4_piece_9, mode=Mode.SUBTRACT)
    with BuildSketch(Plane(origin=(0.86309104, 63.36319104, 0), x_dir=(-0.7068394360706732, 0.7068394360706739, -0.02749587661058627), z_dir=(0.7071067811865479, 0.7071067811865471, 0))) as chamfer_4_piece_10_section:
        Polygon((CHAMFER_4_SIZE * 0.999621916911, CHAMFER_4_SIZE * 0.0274958766106), (-CHAMFER_4_SIZE * 0.0274958766106, CHAMFER_4_SIZE * 0.999621916911), (0, 0), align=None)
    chamfer_4_piece_10 = extrude(amount=14.529231218, mode=Mode.PRIVATE)
    chamfer_4_piece_10 = split(chamfer_4_piece_10, bisect_by=Plane(origin=(4.5, 68.843566402, 0.752491698), z_dir=(1, 0, 0)), keep=Keep.TOP, mode=Mode.PRIVATE)
    add(chamfer_4_piece_10, mode=Mode.SUBTRACT)
    with BuildSketch(Plane(origin=(-11.13680896, 73.63690896, 0), x_dir=(0.706839436070673, 0.7068394360706739, -0.027495876610586376), z_dir=(0.7071067811865479, -0.7071067811865471, 0))) as chamfer_4_piece_11a_section:
        Polygon((CHAMFER_4_SIZE * 0.999621916911, CHAMFER_4_SIZE * 0.0274958766106), (-CHAMFER_4_SIZE * 0.0274958766106, CHAMFER_4_SIZE * 0.999621916911), (0, 0), align=None)
    chamfer_4_piece_11a = extrude(amount=14.529231218, mode=Mode.PRIVATE)
    chamfer_4_piece_11a = split(chamfer_4_piece_11a, bisect_by=Plane(origin=(-4.5, 65.927671271, 0.63618625), z_dir=(1, 0, 0)), keep=Keep.TOP, mode=Mode.PRIVATE)
    with BuildSketch(Plane(origin=(-4.5, 72.143465976, 0), x_dir=(0.9996219169112968, 0, -0.027495876610586372), z_dir=(0, -1, 0))) as chamfer_4_piece_11b_section:
        Polygon((CHAMFER_4_SIZE * 0.999621916911, CHAMFER_4_SIZE * 0.0274958766106), (-CHAMFER_4_SIZE * 0.0274958766106, CHAMFER_4_SIZE * 0.999621916911), (0, 0), align=None)
    chamfer_4_piece_11b = extrude(amount=144.286931952, mode=Mode.PRIVATE)
    chamfer_4_piece_11b = split(chamfer_4_piece_11b, bisect_by=Plane(origin=(-5.258321627, 67.758421627, 0.63618625), z_dir=(0.7071067811865471, 0.7071067811865479, 0)), keep=Keep.TOP, mode=Mode.PRIVATE)
    chamfer_4_piece_11 = chamfer_4_piece_11a & chamfer_4_piece_11b
    add(chamfer_4_piece_11, mode=Mode.SUBTRACT)
    with BuildSketch(Plane(origin=(-4.5, 72.143465976, 0), x_dir=(0.9996219169112968, 0, -0.027495876610586372), z_dir=(0, -1, 0))) as chamfer_4_piece_12a_section:
        Polygon((CHAMFER_4_SIZE * 0.999621916911, CHAMFER_4_SIZE * 0.0274958766106), (-CHAMFER_4_SIZE * 0.0274958766106, CHAMFER_4_SIZE * 0.999621916911), (0, 0), align=None)
    chamfer_4_piece_12a = extrude(amount=144.286931952, mode=Mode.PRIVATE)
    chamfer_4_piece_12a = split(chamfer_4_piece_12a, bisect_by=Plane(origin=(-5.258321627, -67.758421627, 0.63618625), z_dir=(0.7071067811865472, -0.7071067811865479, 0)), keep=Keep.TOP, mode=Mode.PRIVATE)
    with BuildSketch(Plane(origin=(-0.86309104, -63.36319104, 0), x_dir=(0.7068394360706732, -0.7068394360706739, -0.027495876610586244), z_dir=(-0.7071067811865479, -0.7071067811865472, 0))) as chamfer_4_piece_12b_section:
        Polygon((CHAMFER_4_SIZE * 0.999621916911, CHAMFER_4_SIZE * 0.0274958766106), (-CHAMFER_4_SIZE * 0.0274958766106, CHAMFER_4_SIZE * 0.999621916911), (0, 0), align=None)
    chamfer_4_piece_12b = extrude(amount=14.529231218, mode=Mode.PRIVATE)
    chamfer_4_piece_12b = split(chamfer_4_piece_12b, bisect_by=Plane(origin=(-4.5, -65.927671271, 0.63618625), z_dir=(1, 0, 0)), keep=Keep.TOP, mode=Mode.PRIVATE)
    chamfer_4_piece_12 = chamfer_4_piece_12a & chamfer_4_piece_12b
    add(chamfer_4_piece_12, mode=Mode.SUBTRACT)
    with BuildSketch(Plane(origin=(4.5, -72.143465976, 0), x_dir=(-0.9996219169112968, 0, -0.027495876610586372), z_dir=(0, 1, 0))) as chamfer_4_piece_13a_section:
        Polygon((CHAMFER_4_SIZE * 0.999621916911, CHAMFER_4_SIZE * 0.0274958766106), (-CHAMFER_4_SIZE * 0.0274958766106, CHAMFER_4_SIZE * 0.999621916911), (0, 0), align=None)
    chamfer_4_piece_13a = extrude(amount=144.286931952, mode=Mode.PRIVATE)
    chamfer_4_piece_13a = split(chamfer_4_piece_13a, bisect_by=Plane(origin=(5.258321627, -67.758421627, 0.63618625), z_dir=(-0.7071067811865472, -0.7071067811865479, 0)), keep=Keep.TOP, mode=Mode.PRIVATE)
    with BuildSketch(Plane(origin=(11.13680896, -73.63690896, 0), x_dir=(-0.7068394360706731, -0.7068394360706738, -0.027495876610586365), z_dir=(-0.7071067811865479, 0.7071067811865472, 0))) as chamfer_4_piece_13b_section:
        Polygon((CHAMFER_4_SIZE * 0.999621916911, CHAMFER_4_SIZE * 0.0274958766106), (-CHAMFER_4_SIZE * 0.0274958766106, CHAMFER_4_SIZE * 0.999621916911), (0, 0), align=None)
    chamfer_4_piece_13b = extrude(amount=14.529231218, mode=Mode.PRIVATE)
    chamfer_4_piece_13b = split(chamfer_4_piece_13b, bisect_by=Plane(origin=(4.5, -65.927671271, 0.63618625), z_dir=(-1, 0, 0)), keep=Keep.TOP, mode=Mode.PRIVATE)
    chamfer_4_piece_13 = chamfer_4_piece_13a & chamfer_4_piece_13b
    add(chamfer_4_piece_13, mode=Mode.SUBTRACT)
    with BuildSketch(Plane(origin=(0.86309104, 63.36319104, 0), x_dir=(-0.7068394360706732, 0.7068394360706739, -0.02749587661058627), z_dir=(0.7071067811865479, 0.7071067811865471, 0))) as chamfer_4_piece_14a_section:
        Polygon((CHAMFER_4_SIZE * 0.999621916911, CHAMFER_4_SIZE * 0.0274958766106), (-CHAMFER_4_SIZE * 0.0274958766106, CHAMFER_4_SIZE * 0.999621916911), (0, 0), align=None)
    chamfer_4_piece_14a = extrude(amount=14.529231218, mode=Mode.PRIVATE)
    chamfer_4_piece_14a = split(chamfer_4_piece_14a, bisect_by=Plane(origin=(4.5, 65.927671271, 0.63618625), z_dir=(-1, 0, 0)), keep=Keep.TOP, mode=Mode.PRIVATE)
    with BuildSketch(Plane(origin=(4.5, -72.143465976, 0), x_dir=(-0.9996219169112968, 0, -0.027495876610586372), z_dir=(0, 1, 0))) as chamfer_4_piece_14b_section:
        Polygon((CHAMFER_4_SIZE * 0.999621916911, CHAMFER_4_SIZE * 0.0274958766106), (-CHAMFER_4_SIZE * 0.0274958766106, CHAMFER_4_SIZE * 0.999621916911), (0, 0), align=None)
    chamfer_4_piece_14b = extrude(amount=144.286931952, mode=Mode.PRIVATE)
    chamfer_4_piece_14b = split(chamfer_4_piece_14b, bisect_by=Plane(origin=(5.258321627, 67.758421627, 0.63618625), z_dir=(-0.7071067811865471, 0.7071067811865479, 0)), keep=Keep.TOP, mode=Mode.PRIVATE)
    chamfer_4_piece_14 = chamfer_4_piece_14a & chamfer_4_piece_14b
    add(chamfer_4_piece_14, mode=Mode.SUBTRACT)

    # 圆角1
    fillet_1_edges = [part.edges().sort_by_distance(p)[0] for p in [
        (-4.05, 75, 0),
    ]]
    fillet(fillet_1_edges, radius=FILLET_1_R)

    # 圆角2
    fillet_2_edges = [part.edges().sort_by_distance(p)[0] for p in [
        (-2.5, -75, 0),
    ]]
    fillet(fillet_2_edges, radius=FILLET_2_R)

    # 草图3 → 切除-拉伸1 (cut)
    with BuildSketch(Plane(origin=(0, 0, 0), x_dir=(-1, 0, 0), z_dir=(0, 0, -1))):
        with Locations((0.058364989, -12.057904349)):
            Rectangle(SKETCH_3_W, SKETCH_3_H)
    extrude(amount=-CUT_EXTRUDE_1_DEPTH, mode=Mode.SUBTRACT)

    # 倒角5
    chamfer_5_edges = [part.edges().sort_by_distance(p)[0] for p in [
        (0, 62, 2),
    ]]
    chamfer(chamfer_5_edges, length=CHAMFER_5_SIZE - 0.0001)  # a hair under: the kernel refuses the full size

    # 草图4 → 切除-拉伸2 (cut)
    with BuildSketch(Plane(origin=(0, 0, 2), x_dir=(-1, 0, 0), z_dir=(0, 0, -1))):
        with Locations((0, -75)):
            Circle(SKETCH_4_R)
    extrude(amount=-CUT_EXTRUDE_2_DEPTH, mode=Mode.SUBTRACT)

    # 圆角3
    fillet_3_edges = [part.edges().sort_by_distance(p)[0] for p in [
        (4.05, -75, 2),
    ]]
    fillet(fillet_3_edges, radius=FILLET_3_R)


solid = part.part
